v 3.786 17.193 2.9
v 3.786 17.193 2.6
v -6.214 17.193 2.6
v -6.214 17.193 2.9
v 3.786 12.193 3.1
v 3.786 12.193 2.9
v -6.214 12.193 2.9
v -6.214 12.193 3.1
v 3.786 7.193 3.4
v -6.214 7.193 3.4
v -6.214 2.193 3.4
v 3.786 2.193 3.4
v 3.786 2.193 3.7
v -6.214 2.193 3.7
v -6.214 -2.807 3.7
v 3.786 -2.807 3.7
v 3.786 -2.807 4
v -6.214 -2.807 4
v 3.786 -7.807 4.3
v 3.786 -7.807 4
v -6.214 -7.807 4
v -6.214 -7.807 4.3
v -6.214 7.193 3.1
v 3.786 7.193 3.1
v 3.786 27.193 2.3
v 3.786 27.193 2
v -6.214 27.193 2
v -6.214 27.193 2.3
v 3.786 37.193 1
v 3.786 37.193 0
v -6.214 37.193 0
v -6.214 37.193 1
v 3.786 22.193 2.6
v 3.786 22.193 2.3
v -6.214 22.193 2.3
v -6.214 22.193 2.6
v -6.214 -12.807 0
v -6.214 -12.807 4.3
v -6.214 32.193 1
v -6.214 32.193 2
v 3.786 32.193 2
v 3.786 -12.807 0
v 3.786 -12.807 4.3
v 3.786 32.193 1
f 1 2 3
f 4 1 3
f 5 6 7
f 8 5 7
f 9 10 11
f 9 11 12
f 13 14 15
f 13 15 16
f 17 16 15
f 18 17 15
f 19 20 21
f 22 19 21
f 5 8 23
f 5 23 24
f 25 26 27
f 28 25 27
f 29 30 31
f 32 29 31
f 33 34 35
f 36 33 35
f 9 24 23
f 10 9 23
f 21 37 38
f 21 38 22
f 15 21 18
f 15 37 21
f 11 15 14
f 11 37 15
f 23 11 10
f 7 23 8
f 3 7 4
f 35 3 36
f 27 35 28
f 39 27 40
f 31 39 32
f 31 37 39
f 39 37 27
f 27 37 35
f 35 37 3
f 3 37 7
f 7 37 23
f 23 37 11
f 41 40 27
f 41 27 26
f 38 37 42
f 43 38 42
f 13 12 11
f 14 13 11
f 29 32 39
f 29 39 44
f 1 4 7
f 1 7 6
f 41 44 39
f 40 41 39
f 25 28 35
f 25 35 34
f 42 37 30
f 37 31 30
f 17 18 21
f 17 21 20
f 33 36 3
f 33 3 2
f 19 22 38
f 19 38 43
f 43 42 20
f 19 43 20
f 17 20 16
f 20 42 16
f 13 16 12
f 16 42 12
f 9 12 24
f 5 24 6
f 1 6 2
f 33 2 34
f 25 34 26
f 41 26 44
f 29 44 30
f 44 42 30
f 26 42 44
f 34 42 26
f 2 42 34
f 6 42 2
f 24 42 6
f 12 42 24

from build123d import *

# Parameters (mm, degrees)
F0_W      = 5
F0_H      = 5
F1_DEPTH  = 1
F2_DEPTH  = 2
F3_DEPTH  = 2.3
F4_DEPTH  = 2.6
F5_DEPTH  = 2.9
F6_DEPTH  = 3.1
F7_DEPTH  = 3.4
F8_DEPTH  = 3.7
F9_DEPTH  = 4
F10_DEPTH = 4.3


with BuildPart() as f1:
    # F0 (on Top) → F1 (new body)
    with BuildSketch(Plane.XY):
        with Locations((-3.713795, 34.692926)):
            Rectangle(F0_W, F0_H)
        with Locations((1.286205, 34.692926)):
            Rectangle(F0_W, F0_H)
    extrude(amount=F1_DEPTH)

    # F0 (on Top) → F2 (join)
    with BuildSketch(Plane.XY):
        with Locations((-3.713795, 29.692926)):
            Rectangle(F0_W, F0_H)
        with Locations((1.286205, 29.692926)):
            Rectangle(F0_W, F0_H)
    extrude(amount=F2_DEPTH)

    # F0 (on Top) → F3 (join)
    with BuildSketch(Plane.XY):
        with Locations((-3.713795, 24.692926)):
            Rectangle(F0_W, F0_H)
        with Locations((1.286205, 24.692926)):
            Rectangle(F0_W, F0_H)
    extrude(amount=F3_DEPTH)

    # F0 (on Top) → F4 (join)
    with BuildSketch(Plane.XY):
        with Locations((1.286205, 19.692926)):
            Rectangle(F0_W, F0_H)
        with Locations((-3.713795, 19.692926)):
            Rectangle(F0_W, F0_H)
    extrude(amount=F4_DEPTH)

    # F0 (on Top) → F5 (join)
    with BuildSketch(Plane.XY):
        with Locations((-3.713795, 14.692926)):
            Rectangle(F0_W, F0_H)
        with Locations((1.286205, 14.692926)):
            Rectangle(F0_W, F0_H)
    extrude(amount=F5_DEPTH)

    # F0 (on Top) → F6 (join)
    with BuildSketch(Plane.XY):
        with Locations((-3.713795, 9.692926)):
            Rectangle(F0_W, F0_H)
        with Locations((1.286205, 9.692926)):
            Rectangle(F0_W, F0_H)
    extrude(amount=F6_DEPTH)

    # F0 (on Top) → F7 (join)
    with BuildSketch(Plane.XY):
        with Locations((-3.713795, 4.692926)):
            Rectangle(F0_W, F0_H)
        with Locations((1.286205, 4.692926)):
            Rectangle(F0_W, F0_H)
    extrude(amount=F7_DEPTH)

    # F0 (on Top) → F8 (join)
    with BuildSketch(Plane.XY):
        with Locations((-3.713795, -0.307074)):
            Rectangle(F0_W, F0_H)
        with Locations((1.286205, -0.307074)):
            Rectangle(F0_W, F0_H)
    extrude(amount=F8_DEPTH)

    # F0 (on Top) → F9 (join)
    with BuildSketch(Plane.XY):
        with Locations((-3.713795, -5.307074)):
            Rectangle(F0_W, F0_H)
        with Locations((1.286205, -5.307074)):
            Rectangle(F0_W, F0_H)
    extrude(amount=F9_DEPTH)

    # F0 (on Top) → F10 (join)
    with BuildSketch(Plane.XY):
        with Locations((-3.713795, -10.307074)):
            Rectangle(F0_W, F0_H)
        with Locations((1.286205, -10.307074)):
            Rectangle(F0_W, F0_H)
    extrude(amount=F10_DEPTH)


solid = f1.part
